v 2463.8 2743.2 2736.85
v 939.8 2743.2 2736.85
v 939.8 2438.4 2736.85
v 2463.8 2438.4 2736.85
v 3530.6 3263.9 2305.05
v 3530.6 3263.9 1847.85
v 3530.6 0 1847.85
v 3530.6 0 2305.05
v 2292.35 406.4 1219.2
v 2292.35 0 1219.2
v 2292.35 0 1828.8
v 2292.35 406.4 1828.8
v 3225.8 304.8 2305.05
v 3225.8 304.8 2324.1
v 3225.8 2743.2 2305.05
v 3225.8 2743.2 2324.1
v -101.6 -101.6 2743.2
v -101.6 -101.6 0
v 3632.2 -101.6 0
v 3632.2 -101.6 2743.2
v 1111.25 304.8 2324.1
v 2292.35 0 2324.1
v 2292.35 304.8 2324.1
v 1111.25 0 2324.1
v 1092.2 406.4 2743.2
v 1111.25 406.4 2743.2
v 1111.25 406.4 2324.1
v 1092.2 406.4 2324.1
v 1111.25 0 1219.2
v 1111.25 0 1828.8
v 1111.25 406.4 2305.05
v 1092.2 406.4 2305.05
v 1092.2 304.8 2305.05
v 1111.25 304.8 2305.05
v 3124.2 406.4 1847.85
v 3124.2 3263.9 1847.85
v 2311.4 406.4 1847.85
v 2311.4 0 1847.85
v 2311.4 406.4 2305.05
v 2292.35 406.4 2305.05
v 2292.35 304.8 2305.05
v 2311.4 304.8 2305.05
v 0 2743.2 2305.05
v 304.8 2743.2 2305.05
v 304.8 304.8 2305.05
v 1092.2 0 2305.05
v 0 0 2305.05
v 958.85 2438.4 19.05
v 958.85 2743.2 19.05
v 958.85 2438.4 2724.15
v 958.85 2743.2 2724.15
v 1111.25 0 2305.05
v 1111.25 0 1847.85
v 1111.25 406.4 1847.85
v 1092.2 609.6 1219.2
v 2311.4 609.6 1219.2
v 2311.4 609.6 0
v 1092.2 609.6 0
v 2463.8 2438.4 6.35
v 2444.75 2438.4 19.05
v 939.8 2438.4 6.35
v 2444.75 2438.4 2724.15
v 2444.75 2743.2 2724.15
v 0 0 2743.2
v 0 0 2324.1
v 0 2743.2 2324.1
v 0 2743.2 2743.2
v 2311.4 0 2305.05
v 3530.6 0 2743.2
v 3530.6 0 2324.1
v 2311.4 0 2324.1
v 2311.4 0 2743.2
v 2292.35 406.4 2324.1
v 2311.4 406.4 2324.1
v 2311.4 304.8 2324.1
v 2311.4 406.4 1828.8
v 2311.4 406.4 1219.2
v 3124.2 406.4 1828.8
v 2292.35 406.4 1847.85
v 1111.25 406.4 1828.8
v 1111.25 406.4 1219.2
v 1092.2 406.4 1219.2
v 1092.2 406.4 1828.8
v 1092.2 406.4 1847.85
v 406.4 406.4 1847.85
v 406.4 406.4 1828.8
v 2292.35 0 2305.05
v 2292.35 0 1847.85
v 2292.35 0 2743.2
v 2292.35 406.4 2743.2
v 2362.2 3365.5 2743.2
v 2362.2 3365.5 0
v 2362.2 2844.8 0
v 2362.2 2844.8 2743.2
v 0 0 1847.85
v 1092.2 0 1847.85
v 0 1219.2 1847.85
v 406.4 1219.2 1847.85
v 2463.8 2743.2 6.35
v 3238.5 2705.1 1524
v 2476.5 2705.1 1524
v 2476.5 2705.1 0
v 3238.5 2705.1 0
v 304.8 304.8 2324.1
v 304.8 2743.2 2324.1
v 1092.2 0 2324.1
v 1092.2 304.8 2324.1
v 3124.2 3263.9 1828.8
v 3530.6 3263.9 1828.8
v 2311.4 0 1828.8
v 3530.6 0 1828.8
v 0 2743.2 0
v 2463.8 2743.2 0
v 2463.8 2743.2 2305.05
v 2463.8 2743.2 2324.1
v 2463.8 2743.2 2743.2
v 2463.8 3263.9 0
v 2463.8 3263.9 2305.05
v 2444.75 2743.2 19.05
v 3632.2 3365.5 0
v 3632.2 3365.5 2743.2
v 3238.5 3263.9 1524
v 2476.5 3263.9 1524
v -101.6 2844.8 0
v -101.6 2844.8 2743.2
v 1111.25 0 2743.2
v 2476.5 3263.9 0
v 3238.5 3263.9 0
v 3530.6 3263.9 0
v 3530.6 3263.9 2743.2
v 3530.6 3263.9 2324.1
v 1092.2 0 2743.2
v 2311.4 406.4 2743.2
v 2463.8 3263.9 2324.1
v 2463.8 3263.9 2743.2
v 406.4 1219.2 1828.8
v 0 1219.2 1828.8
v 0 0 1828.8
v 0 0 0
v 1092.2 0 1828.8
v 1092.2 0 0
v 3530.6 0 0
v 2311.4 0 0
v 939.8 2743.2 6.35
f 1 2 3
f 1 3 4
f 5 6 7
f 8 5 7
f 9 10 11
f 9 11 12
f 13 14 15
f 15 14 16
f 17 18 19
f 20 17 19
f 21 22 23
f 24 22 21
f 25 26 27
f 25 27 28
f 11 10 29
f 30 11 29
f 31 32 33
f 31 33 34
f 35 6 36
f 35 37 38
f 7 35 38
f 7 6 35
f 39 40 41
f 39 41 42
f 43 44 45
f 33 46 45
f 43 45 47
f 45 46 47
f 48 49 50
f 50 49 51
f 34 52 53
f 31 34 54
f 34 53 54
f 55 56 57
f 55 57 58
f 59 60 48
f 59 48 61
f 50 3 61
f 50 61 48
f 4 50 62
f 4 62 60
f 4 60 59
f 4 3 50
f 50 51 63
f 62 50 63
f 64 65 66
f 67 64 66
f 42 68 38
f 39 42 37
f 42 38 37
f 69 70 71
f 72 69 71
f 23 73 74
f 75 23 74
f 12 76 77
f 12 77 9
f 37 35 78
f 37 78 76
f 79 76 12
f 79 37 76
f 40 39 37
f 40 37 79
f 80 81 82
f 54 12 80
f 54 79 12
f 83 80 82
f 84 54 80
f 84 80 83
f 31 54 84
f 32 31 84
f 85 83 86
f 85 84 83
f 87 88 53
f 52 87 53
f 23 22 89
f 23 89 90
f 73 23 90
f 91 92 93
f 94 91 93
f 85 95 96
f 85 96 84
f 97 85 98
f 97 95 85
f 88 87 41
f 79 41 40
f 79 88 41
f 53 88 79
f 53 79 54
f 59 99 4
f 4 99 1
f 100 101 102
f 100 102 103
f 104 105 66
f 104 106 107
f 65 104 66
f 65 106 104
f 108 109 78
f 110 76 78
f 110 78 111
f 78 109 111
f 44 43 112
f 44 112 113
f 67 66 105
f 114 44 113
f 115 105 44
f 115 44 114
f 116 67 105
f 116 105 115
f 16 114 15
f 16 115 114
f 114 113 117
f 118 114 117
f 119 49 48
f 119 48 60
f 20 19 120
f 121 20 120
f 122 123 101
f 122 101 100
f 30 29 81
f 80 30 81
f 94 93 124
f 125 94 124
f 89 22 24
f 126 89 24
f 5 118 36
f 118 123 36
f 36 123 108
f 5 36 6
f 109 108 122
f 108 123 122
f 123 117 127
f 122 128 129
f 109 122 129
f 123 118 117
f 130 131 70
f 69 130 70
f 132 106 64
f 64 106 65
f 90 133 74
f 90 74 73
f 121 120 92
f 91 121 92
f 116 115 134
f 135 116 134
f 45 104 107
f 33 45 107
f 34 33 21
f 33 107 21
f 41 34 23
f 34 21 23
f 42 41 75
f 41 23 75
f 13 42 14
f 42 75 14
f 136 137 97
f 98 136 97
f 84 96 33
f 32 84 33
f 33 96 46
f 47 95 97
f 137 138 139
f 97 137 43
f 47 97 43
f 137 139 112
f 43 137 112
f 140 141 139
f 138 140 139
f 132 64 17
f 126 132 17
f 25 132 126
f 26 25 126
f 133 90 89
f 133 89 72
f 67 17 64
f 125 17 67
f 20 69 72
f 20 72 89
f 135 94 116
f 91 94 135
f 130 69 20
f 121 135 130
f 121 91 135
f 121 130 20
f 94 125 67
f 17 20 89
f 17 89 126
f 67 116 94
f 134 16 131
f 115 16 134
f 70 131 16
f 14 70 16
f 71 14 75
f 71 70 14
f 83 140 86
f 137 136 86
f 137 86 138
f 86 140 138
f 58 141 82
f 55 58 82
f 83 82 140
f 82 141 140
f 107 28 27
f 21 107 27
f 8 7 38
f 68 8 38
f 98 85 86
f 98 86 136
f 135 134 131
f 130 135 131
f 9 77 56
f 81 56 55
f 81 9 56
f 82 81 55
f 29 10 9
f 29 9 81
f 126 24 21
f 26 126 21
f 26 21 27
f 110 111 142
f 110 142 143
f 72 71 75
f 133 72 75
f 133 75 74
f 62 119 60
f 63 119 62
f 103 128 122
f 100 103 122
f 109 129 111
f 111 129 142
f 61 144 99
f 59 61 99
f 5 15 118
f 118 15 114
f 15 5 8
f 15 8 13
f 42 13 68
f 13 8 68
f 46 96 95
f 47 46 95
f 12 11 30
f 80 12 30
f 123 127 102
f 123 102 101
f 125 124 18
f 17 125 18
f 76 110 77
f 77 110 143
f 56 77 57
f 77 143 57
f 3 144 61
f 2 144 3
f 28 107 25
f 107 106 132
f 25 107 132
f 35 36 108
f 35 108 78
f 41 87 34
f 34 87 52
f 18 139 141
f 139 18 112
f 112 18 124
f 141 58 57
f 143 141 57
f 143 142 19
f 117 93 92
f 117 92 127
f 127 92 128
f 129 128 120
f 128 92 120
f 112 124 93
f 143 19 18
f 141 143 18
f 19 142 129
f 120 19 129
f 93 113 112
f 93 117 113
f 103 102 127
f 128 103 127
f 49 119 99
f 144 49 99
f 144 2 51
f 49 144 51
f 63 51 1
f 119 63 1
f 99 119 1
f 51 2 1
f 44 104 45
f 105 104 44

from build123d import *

# Parameters (mm, degrees)
F1_DEPTH  = 2743.2
F2_W      = 762
F2_H      = 1524
F3_DEPTH  = 558.8
F4_W      = 1524
F4_H      = 2730.5
F4_W_2    = 1485.9
F4_H_2    = 2705.1
F5_DEPTH  = 304.8
F6_W      = 1219.2
F6_H      = 19.05
F7_DEPTH  = 406.4
F8_W      = 1219.2
F8_H      = 1219.2
F9_DEPTH  = 609.6
F10_W     = 19.05
F10_H     = 406.4
F11_DEPTH = 1524
F12_W     = 3124.2
F12_H     = 19.05
F13_DEPTH = 406.4
F14_W     = 2857.5
F14_H     = 19.05
F15_DEPTH = 406.4
F16_W     = 3530.6
F16_H     = 19.05
F17_DEPTH = 3263.9
F18_W     = 2921
F18_H     = 2438.4
F19_DEPTH = 19.05
F20_W     = 2362.2
F20_H     = 419.1000000008
F21_DEPTH = 2324.101


with BuildPart() as f1:
    # F0 (on Top) → F1 (new body)
    with BuildSketch(Plane.XY):
        Polygon((2362.2, 3365.5), (2362.2, 2844.8), (-101.6, 2844.8), (-101.6, -101.6), (3632.2, -101.6), (3632.2, 3365.5), align=None)
        Polygon((3530.6, 0), (0, 0), (0, 2743.2), (2463.8, 2743.2), (2463.8, 3263.9), (3530.6, 3263.9), align=None, mode=Mode.SUBTRACT)
    extrude(amount=F1_DEPTH)

    # F2 (on face) → F3 (join)
    with BuildSketch(Plane.XZ.offset(-3263.9)):
        with Locations((2857.5, 762)):
            Rectangle(F2_W, F2_H)
    extrude(amount=F3_DEPTH)

    # F6 (on face) → F7 (join)
    with BuildSketch(Plane.YZ):
        with Locations((609.6, 1838.325)):
            Rectangle(F6_W, F6_H)
    extrude(amount=F7_DEPTH)

    # F8 (on face) → F9 (join)
    with BuildSketch(Plane(origin=(0, 0, 0), x_dir=(-1, 0, 0), z_dir=(0, 1, 0))):
        with Locations((-1701.8, 609.6)):
            Rectangle(F8_W, F8_H)
    extrude(amount=F9_DEPTH)

    # F10 (on face) → F11 (join)
    with BuildSketch(Plane.XY.offset(1219.2)):
        with Locations((2301.875, 203.2)):
            Rectangle(F10_W, F10_H)
        with Locations((1101.725, 203.2)):
            Rectangle(F10_W, F10_H)
    extrude(amount=F11_DEPTH)

    # F12 (on face) → F13 (join)
    with BuildSketch(Plane(origin=(0, 0, 0), x_dir=(-1, 0, 0), z_dir=(0, 1, 0))):
        with Locations((-1968.5, 1838.325)):
            Rectangle(F12_W, F12_H)
    extrude(amount=F13_DEPTH)

    # F14 (on face) → F15 (join)
    with BuildSketch(Plane(origin=(3530.6, 0, 0), x_dir=(0, -1, 0), z_dir=(-1, 0, 0))):
        with Locations((-1835.15, 1838.325)):
            Rectangle(F14_W, F14_H)
    extrude(amount=F15_DEPTH)

    # F16 (on face) → F17 (join, through all)
    with BuildSketch(Plane(origin=(0, 0, 0), x_dir=(-1, 0, 0), z_dir=(0, 1, 0))):
        with Locations((-1765.3, 2314.575)):
            Rectangle(F16_W, F16_H)
    extrude(amount=F17_DEPTH)

    # F18 (on face) → F19 (cut)
    with BuildSketch(Plane.XY.offset(2324.1)):
        with Locations((1765.3, 1524)):
            Rectangle(F18_W, F18_H)
    extrude(amount=-F19_DEPTH, mode=Mode.SUBTRACT)

    # F20 (on face) → F21 (cut, through all)
    with BuildSketch(Plane.XY.offset(2324.1)):
        with Locations((1181.1, 3054.3500000004)):
            Rectangle(F20_W, F20_H)
    extrude(amount=-F21_DEPTH, mode=Mode.SUBTRACT)


with BuildPart() as f5:
    # F4 (on face) → F5 (new body)
    with BuildSketch(Plane.XZ.offset(-2743.2)):
        with Locations((1701.8, 1371.6)):
            Rectangle(F4_W, F4_H)
        with Locations((1701.8, 1371.6)):
            Rectangle(F4_W_2, F4_H_2, mode=Mode.SUBTRACT)
    extrude(amount=F5_DEPTH)


solid = Compound([f1.part, f5.part])
